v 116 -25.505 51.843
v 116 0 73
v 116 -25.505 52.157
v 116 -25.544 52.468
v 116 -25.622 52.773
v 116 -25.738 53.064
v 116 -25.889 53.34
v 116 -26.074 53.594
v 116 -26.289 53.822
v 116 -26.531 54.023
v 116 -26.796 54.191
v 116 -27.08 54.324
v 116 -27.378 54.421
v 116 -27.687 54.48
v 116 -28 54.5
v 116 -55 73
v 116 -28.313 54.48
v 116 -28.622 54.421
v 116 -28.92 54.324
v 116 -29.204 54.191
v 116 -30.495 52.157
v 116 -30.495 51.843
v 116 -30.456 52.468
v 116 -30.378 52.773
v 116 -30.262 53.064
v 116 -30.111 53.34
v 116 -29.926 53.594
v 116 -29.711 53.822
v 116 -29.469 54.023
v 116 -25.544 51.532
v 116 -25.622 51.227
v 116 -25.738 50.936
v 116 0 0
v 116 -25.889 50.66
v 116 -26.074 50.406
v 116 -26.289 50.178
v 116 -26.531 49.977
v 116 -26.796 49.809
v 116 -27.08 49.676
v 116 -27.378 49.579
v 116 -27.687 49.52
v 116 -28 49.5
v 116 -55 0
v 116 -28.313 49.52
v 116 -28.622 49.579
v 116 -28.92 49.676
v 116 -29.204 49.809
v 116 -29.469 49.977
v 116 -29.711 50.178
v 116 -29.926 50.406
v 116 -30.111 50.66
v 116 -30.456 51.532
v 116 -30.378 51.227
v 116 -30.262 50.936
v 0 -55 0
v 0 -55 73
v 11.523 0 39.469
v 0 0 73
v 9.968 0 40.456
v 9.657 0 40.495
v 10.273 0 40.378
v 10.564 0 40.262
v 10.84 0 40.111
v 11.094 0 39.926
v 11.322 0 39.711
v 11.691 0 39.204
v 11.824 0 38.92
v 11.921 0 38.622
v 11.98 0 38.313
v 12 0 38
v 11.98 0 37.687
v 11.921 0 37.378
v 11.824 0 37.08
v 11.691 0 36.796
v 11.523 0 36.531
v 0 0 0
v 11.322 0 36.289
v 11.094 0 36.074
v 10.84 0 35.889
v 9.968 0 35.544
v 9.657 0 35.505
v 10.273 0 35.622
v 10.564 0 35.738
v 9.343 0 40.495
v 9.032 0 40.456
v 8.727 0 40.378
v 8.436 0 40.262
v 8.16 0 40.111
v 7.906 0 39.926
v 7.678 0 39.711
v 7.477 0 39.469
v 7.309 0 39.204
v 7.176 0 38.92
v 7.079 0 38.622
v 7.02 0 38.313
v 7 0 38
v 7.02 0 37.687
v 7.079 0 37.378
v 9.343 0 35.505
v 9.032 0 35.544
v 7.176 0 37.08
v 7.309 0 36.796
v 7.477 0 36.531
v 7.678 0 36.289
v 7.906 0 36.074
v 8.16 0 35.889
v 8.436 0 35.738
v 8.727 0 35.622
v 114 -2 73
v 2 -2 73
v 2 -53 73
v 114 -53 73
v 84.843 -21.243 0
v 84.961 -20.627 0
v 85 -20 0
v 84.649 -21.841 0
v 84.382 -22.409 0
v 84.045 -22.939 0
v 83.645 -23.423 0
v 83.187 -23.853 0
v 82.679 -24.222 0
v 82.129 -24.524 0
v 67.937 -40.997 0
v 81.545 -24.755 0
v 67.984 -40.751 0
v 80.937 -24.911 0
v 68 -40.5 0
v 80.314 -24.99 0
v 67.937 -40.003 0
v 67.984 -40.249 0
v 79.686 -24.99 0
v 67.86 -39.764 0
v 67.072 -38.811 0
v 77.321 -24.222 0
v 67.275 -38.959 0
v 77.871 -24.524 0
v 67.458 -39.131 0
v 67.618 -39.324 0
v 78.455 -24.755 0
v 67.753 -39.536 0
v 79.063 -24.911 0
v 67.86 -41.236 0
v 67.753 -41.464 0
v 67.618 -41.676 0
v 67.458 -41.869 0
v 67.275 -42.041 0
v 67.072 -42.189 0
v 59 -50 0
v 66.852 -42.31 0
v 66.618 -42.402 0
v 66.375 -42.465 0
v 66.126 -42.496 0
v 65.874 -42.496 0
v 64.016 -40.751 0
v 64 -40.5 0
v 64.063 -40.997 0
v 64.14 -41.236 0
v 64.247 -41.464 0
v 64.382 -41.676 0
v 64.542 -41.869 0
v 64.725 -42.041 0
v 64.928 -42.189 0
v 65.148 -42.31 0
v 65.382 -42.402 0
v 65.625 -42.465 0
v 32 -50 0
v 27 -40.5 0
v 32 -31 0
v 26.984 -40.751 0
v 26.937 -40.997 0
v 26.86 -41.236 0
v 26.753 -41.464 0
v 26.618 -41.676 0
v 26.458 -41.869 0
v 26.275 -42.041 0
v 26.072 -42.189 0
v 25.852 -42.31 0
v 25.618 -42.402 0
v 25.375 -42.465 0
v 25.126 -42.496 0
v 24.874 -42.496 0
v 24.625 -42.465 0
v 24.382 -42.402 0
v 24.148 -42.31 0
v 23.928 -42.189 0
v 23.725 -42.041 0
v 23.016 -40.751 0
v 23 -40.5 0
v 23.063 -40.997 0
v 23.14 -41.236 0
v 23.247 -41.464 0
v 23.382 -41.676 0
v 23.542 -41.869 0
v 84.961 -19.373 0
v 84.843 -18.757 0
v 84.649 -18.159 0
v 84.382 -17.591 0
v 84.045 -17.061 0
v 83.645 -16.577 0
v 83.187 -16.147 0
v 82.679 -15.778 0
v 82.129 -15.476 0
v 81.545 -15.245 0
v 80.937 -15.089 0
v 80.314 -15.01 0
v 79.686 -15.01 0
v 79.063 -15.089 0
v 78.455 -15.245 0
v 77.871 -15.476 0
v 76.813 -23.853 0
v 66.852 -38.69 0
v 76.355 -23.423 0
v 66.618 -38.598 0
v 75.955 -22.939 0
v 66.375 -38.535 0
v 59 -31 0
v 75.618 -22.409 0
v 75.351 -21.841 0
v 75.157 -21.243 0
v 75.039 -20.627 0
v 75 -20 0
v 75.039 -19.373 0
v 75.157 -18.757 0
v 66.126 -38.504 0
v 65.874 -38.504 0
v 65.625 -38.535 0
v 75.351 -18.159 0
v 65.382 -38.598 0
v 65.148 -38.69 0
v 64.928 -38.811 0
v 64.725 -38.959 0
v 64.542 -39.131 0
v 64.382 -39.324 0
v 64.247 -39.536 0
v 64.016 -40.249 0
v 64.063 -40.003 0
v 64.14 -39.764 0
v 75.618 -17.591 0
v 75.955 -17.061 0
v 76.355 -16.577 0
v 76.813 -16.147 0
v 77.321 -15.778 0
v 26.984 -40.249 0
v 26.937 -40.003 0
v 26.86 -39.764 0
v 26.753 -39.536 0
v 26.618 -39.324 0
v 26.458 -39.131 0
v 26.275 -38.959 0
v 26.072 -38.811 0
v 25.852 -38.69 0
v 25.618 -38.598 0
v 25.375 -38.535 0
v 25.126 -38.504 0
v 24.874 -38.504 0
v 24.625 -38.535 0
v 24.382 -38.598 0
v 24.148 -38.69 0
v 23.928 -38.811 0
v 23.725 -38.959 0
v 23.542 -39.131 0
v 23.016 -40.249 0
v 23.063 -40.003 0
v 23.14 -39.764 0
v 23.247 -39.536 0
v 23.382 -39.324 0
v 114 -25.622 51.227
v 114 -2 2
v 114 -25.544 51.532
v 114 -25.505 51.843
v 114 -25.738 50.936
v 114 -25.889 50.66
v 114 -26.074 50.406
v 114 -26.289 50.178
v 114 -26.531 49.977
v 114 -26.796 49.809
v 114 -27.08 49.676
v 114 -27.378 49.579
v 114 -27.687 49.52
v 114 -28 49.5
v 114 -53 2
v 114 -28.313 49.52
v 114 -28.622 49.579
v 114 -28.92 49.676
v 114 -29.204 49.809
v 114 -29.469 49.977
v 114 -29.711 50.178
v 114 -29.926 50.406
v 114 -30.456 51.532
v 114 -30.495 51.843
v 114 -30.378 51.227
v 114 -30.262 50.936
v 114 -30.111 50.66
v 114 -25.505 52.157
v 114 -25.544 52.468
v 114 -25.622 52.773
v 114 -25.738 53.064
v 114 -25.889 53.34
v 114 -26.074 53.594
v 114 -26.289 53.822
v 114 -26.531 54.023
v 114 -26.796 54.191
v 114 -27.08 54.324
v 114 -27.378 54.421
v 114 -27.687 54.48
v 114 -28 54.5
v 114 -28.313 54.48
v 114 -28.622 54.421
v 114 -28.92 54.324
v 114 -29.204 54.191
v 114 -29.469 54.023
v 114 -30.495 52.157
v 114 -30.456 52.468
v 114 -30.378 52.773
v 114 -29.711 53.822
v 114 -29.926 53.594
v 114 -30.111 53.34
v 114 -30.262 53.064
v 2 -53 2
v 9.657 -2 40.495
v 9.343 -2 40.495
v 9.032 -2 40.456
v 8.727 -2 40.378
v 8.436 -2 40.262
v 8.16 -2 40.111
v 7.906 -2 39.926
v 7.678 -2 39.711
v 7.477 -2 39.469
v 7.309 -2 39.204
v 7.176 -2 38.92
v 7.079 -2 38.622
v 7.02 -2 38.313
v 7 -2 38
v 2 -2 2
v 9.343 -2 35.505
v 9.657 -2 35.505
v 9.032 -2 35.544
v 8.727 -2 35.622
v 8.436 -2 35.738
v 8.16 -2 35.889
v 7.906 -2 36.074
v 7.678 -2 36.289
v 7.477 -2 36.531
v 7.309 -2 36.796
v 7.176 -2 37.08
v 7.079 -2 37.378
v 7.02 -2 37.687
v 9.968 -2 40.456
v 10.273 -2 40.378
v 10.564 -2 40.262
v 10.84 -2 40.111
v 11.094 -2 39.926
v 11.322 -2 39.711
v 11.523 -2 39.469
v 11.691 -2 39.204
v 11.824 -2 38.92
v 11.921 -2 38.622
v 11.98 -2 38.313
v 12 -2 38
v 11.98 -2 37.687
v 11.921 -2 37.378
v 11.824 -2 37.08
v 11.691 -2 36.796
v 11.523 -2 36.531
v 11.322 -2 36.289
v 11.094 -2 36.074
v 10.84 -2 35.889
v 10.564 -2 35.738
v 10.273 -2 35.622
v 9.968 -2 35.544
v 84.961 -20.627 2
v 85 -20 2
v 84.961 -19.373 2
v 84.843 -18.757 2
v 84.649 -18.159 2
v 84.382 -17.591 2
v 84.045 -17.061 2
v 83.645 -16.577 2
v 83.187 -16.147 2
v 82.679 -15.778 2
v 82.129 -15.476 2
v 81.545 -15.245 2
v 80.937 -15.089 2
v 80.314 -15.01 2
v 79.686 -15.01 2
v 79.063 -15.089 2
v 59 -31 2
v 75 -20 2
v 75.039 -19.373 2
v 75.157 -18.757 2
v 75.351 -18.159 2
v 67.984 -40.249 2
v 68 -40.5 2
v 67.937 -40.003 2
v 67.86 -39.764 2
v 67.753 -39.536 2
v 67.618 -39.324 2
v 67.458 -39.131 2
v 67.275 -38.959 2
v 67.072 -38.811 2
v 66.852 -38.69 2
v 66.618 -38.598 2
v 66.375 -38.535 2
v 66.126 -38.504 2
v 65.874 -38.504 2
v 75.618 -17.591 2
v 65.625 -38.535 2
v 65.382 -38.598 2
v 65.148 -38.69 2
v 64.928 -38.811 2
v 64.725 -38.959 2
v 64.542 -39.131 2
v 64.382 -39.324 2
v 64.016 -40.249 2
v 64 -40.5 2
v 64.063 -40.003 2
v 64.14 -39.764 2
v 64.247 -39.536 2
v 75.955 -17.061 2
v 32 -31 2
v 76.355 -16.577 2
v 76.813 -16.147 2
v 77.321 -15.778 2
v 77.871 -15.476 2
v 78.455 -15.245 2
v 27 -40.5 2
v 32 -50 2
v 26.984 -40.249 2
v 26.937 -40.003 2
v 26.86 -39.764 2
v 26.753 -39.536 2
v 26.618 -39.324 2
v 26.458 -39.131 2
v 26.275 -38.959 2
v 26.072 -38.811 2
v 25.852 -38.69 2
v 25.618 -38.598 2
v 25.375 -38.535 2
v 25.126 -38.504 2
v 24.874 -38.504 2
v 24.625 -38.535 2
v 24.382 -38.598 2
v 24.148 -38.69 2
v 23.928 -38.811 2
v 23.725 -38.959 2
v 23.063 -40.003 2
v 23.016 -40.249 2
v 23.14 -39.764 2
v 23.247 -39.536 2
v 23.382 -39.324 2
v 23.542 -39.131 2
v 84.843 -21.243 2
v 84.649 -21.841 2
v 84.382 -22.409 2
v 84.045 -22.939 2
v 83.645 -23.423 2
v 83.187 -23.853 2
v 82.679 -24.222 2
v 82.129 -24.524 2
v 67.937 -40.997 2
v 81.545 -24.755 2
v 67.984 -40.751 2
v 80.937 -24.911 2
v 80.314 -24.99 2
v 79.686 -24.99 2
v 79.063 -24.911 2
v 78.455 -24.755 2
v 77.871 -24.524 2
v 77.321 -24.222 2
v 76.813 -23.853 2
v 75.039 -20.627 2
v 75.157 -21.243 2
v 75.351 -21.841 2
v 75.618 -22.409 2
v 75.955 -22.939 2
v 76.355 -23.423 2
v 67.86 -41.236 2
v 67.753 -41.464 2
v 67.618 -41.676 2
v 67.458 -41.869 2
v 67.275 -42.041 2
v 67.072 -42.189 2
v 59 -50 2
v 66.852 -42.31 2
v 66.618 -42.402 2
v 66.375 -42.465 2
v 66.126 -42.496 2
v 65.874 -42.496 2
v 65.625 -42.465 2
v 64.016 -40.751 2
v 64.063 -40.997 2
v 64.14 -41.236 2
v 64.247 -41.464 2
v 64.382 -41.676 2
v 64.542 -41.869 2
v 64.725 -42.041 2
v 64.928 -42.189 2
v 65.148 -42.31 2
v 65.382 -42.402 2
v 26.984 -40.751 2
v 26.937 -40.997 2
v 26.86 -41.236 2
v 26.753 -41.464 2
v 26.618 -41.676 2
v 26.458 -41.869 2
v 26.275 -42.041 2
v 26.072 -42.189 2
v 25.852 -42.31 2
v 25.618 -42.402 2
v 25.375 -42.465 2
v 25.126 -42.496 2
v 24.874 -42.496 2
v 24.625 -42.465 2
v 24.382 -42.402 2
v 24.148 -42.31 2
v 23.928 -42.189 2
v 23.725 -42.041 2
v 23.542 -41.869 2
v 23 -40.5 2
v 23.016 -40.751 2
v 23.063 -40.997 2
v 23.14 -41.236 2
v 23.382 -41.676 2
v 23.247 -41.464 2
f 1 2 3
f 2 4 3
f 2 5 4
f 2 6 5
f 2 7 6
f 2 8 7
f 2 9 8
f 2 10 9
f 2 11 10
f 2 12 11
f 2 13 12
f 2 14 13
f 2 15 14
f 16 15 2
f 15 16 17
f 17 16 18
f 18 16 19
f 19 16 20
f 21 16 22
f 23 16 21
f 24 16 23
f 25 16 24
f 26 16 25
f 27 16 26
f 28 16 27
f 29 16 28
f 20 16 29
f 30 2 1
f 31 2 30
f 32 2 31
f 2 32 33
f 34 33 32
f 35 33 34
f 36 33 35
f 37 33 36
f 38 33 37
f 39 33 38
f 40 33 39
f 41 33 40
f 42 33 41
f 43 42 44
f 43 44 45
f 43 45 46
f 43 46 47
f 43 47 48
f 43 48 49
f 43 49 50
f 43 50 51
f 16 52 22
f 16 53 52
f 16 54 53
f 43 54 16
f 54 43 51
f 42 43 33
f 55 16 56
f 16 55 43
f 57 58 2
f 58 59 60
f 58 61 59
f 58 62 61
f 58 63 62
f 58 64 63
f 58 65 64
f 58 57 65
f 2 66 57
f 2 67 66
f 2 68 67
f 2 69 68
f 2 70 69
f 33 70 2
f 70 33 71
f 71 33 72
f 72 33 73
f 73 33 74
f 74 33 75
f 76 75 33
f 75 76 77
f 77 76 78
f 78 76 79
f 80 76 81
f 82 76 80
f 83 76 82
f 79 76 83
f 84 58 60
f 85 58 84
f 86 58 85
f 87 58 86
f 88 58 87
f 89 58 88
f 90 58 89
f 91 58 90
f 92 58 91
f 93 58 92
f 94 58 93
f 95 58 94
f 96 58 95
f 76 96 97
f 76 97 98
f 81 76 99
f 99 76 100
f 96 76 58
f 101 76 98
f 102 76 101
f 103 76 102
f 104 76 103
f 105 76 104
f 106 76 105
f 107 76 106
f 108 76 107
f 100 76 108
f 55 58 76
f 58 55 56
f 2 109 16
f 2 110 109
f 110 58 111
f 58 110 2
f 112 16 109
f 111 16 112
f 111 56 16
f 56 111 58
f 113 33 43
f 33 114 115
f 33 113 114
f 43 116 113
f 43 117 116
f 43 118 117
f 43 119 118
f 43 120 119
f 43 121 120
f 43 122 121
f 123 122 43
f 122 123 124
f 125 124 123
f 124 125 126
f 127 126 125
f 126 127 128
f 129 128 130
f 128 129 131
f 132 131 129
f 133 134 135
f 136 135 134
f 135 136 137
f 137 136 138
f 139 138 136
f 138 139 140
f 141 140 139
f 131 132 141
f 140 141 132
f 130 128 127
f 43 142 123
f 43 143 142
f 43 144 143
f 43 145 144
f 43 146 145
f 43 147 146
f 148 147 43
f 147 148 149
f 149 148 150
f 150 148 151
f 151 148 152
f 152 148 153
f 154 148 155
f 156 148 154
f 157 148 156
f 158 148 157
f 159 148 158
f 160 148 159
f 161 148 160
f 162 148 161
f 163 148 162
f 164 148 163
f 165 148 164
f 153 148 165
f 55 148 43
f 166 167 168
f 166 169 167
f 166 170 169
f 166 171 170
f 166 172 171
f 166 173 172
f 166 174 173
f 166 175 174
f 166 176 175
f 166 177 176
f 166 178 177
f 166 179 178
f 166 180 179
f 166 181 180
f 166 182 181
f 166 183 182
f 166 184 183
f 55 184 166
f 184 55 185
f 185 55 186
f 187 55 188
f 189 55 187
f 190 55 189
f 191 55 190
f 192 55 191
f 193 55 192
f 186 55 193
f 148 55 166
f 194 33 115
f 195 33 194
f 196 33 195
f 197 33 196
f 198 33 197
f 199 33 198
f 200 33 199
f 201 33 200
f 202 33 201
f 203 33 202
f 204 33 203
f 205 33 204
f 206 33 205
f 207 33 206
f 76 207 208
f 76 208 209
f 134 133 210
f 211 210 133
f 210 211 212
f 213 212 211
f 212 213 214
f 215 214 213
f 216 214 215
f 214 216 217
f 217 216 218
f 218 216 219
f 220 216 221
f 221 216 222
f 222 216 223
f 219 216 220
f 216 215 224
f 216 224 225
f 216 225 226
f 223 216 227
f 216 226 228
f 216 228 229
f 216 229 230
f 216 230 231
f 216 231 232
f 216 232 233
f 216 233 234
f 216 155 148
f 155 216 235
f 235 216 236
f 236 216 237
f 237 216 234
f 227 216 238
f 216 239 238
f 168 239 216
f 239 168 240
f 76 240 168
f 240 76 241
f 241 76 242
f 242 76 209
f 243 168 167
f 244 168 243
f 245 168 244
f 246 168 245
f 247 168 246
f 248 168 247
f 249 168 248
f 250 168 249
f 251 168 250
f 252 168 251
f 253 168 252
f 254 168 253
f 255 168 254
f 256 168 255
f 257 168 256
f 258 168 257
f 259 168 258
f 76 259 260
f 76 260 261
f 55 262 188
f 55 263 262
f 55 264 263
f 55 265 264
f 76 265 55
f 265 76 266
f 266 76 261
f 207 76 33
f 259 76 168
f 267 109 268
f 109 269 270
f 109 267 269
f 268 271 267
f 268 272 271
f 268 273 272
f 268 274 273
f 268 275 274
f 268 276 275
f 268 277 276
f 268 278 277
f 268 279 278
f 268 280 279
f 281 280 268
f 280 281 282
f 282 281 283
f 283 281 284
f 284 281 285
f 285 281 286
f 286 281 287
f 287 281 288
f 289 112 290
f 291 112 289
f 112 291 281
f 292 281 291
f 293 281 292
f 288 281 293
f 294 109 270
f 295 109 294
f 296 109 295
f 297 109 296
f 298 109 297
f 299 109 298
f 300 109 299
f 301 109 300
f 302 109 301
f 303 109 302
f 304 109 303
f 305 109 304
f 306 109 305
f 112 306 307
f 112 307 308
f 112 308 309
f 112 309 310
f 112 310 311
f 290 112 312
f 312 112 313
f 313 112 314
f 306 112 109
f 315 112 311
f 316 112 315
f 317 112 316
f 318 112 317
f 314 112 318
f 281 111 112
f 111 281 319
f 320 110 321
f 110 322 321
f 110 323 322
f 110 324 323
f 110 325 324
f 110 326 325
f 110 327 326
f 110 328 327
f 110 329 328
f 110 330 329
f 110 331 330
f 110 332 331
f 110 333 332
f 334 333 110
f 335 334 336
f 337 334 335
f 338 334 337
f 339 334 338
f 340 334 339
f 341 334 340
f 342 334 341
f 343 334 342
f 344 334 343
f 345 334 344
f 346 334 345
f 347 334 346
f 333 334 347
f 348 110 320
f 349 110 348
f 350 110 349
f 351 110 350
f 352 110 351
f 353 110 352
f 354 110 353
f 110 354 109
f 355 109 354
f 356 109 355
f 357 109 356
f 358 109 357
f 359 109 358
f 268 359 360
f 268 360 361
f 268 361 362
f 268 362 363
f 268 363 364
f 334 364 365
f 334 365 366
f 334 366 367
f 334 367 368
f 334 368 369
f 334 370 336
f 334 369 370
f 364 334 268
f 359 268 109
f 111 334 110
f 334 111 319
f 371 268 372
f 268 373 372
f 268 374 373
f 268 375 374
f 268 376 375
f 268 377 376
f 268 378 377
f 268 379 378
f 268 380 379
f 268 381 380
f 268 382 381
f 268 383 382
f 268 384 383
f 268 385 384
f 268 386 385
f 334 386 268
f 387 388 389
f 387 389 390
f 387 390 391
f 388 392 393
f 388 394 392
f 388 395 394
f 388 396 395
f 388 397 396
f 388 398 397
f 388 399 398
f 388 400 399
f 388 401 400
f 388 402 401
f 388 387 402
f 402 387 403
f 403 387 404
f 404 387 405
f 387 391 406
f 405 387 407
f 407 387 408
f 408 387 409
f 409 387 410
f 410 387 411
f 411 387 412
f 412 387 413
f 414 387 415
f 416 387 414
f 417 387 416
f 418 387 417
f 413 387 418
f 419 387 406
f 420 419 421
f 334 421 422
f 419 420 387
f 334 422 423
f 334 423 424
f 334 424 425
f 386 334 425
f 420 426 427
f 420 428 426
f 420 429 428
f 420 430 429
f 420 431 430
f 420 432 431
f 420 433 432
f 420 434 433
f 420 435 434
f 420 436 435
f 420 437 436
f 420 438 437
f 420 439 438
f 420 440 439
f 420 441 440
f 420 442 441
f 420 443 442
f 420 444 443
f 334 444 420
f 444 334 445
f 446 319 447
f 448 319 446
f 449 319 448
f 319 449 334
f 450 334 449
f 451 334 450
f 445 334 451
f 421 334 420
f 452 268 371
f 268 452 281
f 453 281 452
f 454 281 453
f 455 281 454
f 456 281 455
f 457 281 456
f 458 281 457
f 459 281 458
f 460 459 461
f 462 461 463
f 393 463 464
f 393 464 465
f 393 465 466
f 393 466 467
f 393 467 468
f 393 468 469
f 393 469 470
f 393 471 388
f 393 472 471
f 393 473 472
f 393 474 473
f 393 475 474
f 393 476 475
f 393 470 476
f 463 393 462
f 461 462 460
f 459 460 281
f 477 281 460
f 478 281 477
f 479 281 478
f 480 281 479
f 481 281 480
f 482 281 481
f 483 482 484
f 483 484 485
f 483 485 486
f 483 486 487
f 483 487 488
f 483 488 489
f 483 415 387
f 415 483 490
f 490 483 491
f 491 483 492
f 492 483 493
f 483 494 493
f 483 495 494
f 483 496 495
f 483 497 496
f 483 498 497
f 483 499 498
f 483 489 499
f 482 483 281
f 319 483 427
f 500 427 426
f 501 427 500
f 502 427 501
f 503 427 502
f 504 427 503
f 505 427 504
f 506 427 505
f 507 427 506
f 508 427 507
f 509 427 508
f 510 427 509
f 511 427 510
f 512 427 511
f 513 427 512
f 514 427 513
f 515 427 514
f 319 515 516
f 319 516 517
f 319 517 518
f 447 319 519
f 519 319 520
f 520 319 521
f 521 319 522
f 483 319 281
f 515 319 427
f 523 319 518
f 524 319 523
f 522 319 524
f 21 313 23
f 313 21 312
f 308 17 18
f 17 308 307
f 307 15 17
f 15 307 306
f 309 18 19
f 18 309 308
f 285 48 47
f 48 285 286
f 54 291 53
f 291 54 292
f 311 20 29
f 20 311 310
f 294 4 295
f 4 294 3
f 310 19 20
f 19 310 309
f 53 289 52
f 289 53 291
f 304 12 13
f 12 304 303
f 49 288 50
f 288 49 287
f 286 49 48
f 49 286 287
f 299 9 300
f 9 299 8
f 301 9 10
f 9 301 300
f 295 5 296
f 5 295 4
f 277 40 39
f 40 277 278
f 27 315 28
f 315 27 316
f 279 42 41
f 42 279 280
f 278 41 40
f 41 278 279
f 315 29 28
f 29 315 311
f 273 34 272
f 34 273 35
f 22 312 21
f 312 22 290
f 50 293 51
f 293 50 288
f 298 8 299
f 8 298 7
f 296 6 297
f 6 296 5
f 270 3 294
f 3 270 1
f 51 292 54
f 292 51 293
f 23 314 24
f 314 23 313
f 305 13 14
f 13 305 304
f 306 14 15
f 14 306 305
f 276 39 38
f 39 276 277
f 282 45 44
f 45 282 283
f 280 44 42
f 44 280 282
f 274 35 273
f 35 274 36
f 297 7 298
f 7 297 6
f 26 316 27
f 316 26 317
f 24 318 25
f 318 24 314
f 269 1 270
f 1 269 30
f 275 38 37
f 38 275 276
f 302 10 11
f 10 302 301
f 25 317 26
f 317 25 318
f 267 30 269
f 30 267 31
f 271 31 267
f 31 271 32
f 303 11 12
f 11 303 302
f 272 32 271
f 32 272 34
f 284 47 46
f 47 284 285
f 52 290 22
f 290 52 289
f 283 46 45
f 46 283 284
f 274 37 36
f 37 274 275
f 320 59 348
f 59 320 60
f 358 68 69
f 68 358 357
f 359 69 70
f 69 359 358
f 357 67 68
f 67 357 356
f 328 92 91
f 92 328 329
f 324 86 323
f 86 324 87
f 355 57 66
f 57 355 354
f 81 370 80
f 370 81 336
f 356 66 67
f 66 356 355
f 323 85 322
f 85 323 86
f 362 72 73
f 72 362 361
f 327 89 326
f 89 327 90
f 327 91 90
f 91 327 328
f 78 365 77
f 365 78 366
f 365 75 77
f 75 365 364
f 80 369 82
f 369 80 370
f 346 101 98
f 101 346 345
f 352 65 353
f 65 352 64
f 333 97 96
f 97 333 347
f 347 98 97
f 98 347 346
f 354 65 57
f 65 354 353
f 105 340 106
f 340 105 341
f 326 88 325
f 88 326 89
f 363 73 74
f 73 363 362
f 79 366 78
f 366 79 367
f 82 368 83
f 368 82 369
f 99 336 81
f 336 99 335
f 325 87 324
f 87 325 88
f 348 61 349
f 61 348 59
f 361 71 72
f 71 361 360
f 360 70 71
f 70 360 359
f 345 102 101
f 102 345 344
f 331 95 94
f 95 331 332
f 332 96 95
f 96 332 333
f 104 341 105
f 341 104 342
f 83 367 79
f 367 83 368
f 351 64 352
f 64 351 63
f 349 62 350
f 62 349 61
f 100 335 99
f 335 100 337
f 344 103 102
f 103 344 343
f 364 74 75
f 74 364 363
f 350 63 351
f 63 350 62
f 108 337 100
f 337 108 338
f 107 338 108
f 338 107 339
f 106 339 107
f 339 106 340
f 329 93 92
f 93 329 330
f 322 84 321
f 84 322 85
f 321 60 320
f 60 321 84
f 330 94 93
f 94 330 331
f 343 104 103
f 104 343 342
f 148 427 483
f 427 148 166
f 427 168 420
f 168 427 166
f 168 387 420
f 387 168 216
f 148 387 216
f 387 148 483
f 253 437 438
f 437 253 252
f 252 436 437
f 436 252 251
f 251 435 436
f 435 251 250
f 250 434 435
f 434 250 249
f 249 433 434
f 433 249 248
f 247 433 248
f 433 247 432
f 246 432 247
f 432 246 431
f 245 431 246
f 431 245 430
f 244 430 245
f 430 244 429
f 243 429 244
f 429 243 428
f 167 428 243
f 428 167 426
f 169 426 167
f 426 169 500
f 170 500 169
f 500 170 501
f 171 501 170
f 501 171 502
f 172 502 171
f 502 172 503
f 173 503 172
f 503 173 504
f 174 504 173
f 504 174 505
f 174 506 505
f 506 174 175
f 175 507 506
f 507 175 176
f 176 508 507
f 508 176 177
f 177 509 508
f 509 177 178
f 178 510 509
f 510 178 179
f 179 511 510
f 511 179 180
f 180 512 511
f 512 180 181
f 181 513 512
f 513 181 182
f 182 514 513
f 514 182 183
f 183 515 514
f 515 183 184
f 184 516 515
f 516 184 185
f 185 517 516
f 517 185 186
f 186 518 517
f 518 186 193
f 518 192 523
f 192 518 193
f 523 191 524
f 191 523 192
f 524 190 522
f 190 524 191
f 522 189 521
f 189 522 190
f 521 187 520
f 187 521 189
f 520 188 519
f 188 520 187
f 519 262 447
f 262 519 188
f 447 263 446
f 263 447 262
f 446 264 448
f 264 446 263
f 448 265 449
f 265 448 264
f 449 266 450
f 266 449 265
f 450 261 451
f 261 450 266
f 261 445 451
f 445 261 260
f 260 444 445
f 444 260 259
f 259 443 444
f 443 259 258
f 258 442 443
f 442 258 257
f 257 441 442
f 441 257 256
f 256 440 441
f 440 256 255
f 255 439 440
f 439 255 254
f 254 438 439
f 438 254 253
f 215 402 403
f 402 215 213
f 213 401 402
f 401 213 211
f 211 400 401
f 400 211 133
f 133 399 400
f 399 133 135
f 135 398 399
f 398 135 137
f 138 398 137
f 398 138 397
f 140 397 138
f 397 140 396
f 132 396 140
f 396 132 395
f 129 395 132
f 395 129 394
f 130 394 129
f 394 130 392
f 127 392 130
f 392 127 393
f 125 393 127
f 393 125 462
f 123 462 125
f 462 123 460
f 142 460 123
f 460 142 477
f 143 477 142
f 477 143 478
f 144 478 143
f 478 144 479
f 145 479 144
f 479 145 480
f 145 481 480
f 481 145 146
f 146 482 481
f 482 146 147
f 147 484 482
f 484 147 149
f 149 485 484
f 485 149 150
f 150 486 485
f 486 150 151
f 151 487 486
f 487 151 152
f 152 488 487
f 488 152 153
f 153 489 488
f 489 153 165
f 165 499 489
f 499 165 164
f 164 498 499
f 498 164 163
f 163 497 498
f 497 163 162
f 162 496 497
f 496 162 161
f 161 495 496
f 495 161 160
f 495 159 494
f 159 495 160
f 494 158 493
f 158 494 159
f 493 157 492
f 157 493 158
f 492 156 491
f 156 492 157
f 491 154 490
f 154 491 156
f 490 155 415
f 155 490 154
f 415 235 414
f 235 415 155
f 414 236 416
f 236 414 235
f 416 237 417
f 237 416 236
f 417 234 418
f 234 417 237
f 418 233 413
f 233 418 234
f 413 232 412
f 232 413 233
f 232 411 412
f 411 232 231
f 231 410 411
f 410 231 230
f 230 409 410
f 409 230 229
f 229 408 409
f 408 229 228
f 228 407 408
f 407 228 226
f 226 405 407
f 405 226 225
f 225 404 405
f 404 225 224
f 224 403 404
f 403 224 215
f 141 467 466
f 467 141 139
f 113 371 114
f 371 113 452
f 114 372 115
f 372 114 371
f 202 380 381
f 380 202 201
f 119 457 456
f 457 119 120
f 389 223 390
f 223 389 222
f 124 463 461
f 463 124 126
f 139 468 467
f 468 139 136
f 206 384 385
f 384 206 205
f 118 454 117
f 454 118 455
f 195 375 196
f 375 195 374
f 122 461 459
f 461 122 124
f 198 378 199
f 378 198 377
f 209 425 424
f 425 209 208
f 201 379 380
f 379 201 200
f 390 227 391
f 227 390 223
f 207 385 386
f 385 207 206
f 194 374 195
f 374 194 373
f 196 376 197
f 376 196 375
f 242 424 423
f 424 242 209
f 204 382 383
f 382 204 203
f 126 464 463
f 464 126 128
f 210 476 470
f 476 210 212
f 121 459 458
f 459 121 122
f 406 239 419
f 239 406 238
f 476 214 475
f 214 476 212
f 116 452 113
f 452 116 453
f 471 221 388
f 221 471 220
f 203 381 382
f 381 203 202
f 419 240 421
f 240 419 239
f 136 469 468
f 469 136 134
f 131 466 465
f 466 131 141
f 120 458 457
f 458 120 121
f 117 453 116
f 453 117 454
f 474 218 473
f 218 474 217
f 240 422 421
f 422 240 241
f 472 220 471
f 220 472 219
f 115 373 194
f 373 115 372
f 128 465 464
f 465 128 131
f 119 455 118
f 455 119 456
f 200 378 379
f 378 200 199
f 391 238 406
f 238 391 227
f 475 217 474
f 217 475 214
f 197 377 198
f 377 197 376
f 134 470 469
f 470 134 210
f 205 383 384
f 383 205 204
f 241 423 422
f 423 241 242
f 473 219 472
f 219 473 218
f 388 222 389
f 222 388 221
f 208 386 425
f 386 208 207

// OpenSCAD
/* CONFIGURATION */

// Inner dimensions (dimensions of PSU's front view)
i_w = 112;
i_h = 51;

// wall thickness -- 2mm is recommended, the resulting part will be really robust
wall = 2;

// cover's inner length
// the original part had 61mm, and there's been some space at the end
// however, to give the C14 socket some additional space, we add a little more
i_l = 61 + 10;

/* END CONFIGURATION */


// outer dimensions (calculated from the inner)
o_w = i_w + 2 * wall;
o_l = i_l + wall;
o_h = i_h + 2 * wall;

// original hole diameter is ~ 4mm, but the resulting fit is too lose and there's washers required
// to make the screws hold it properly
b = 5/2;

// the part you put inside the device is the male connector, so one might be tempted to call it a plug
// however, usability wise it's a socket, therefore we'll call a socket here
// this template should work for a majority of plugs, but you should measure yours to make sure it'll fit
module C14_Socket() {
    // holes radius
    b = 2;
    
    // dimensions of the plug
    h = 19;
    w = 27;
    
    $fn = 50;
    
    // holes
    translate([0, h/2]) circle(b);
    translate([7 + w + 7, h/2]) circle(b);
    
    // connector part
    translate([7, 0]) square([w, h]);
}


$fn = 50;

// the actual case
// we rotate it to make printing it easier
rotate([90, 0, 0])
difference() {
    // main body (will be open on the rear end to allow the user to slide in the PSU)
    cube([o_w, o_l, o_h]);

    // inner groove (the PSU will be sled into it)
    translate([wall, wall, wall])
    cube([i_w, i_l, i_h]);
    
    // mounting screw hole on the right wall
    translate([i_w, o_l - 21, 26 + wall])
    rotate([90, 0, 90])
    cylinder(10, b, b);
    
    // mounting screw hole on the bottom wall
    translate([7.5 + wall, o_l - 35, -1])
    rotate([0, 0, 0])
    cylinder(10, b, b);
    
    // cutout for the C14 socket
    translate([25, 5, o_h - wall - 22])
    rotate([90, 0, 0])
    linear_extrude(10) C14_Socket();
    
    // hole for the 12 cable that goes to the printer mainboard
    // use cable ties for strain relief
    translate([80, 5, 20])
    rotate([90, 0, 0])
    cylinder(10, 5, 5);
}
